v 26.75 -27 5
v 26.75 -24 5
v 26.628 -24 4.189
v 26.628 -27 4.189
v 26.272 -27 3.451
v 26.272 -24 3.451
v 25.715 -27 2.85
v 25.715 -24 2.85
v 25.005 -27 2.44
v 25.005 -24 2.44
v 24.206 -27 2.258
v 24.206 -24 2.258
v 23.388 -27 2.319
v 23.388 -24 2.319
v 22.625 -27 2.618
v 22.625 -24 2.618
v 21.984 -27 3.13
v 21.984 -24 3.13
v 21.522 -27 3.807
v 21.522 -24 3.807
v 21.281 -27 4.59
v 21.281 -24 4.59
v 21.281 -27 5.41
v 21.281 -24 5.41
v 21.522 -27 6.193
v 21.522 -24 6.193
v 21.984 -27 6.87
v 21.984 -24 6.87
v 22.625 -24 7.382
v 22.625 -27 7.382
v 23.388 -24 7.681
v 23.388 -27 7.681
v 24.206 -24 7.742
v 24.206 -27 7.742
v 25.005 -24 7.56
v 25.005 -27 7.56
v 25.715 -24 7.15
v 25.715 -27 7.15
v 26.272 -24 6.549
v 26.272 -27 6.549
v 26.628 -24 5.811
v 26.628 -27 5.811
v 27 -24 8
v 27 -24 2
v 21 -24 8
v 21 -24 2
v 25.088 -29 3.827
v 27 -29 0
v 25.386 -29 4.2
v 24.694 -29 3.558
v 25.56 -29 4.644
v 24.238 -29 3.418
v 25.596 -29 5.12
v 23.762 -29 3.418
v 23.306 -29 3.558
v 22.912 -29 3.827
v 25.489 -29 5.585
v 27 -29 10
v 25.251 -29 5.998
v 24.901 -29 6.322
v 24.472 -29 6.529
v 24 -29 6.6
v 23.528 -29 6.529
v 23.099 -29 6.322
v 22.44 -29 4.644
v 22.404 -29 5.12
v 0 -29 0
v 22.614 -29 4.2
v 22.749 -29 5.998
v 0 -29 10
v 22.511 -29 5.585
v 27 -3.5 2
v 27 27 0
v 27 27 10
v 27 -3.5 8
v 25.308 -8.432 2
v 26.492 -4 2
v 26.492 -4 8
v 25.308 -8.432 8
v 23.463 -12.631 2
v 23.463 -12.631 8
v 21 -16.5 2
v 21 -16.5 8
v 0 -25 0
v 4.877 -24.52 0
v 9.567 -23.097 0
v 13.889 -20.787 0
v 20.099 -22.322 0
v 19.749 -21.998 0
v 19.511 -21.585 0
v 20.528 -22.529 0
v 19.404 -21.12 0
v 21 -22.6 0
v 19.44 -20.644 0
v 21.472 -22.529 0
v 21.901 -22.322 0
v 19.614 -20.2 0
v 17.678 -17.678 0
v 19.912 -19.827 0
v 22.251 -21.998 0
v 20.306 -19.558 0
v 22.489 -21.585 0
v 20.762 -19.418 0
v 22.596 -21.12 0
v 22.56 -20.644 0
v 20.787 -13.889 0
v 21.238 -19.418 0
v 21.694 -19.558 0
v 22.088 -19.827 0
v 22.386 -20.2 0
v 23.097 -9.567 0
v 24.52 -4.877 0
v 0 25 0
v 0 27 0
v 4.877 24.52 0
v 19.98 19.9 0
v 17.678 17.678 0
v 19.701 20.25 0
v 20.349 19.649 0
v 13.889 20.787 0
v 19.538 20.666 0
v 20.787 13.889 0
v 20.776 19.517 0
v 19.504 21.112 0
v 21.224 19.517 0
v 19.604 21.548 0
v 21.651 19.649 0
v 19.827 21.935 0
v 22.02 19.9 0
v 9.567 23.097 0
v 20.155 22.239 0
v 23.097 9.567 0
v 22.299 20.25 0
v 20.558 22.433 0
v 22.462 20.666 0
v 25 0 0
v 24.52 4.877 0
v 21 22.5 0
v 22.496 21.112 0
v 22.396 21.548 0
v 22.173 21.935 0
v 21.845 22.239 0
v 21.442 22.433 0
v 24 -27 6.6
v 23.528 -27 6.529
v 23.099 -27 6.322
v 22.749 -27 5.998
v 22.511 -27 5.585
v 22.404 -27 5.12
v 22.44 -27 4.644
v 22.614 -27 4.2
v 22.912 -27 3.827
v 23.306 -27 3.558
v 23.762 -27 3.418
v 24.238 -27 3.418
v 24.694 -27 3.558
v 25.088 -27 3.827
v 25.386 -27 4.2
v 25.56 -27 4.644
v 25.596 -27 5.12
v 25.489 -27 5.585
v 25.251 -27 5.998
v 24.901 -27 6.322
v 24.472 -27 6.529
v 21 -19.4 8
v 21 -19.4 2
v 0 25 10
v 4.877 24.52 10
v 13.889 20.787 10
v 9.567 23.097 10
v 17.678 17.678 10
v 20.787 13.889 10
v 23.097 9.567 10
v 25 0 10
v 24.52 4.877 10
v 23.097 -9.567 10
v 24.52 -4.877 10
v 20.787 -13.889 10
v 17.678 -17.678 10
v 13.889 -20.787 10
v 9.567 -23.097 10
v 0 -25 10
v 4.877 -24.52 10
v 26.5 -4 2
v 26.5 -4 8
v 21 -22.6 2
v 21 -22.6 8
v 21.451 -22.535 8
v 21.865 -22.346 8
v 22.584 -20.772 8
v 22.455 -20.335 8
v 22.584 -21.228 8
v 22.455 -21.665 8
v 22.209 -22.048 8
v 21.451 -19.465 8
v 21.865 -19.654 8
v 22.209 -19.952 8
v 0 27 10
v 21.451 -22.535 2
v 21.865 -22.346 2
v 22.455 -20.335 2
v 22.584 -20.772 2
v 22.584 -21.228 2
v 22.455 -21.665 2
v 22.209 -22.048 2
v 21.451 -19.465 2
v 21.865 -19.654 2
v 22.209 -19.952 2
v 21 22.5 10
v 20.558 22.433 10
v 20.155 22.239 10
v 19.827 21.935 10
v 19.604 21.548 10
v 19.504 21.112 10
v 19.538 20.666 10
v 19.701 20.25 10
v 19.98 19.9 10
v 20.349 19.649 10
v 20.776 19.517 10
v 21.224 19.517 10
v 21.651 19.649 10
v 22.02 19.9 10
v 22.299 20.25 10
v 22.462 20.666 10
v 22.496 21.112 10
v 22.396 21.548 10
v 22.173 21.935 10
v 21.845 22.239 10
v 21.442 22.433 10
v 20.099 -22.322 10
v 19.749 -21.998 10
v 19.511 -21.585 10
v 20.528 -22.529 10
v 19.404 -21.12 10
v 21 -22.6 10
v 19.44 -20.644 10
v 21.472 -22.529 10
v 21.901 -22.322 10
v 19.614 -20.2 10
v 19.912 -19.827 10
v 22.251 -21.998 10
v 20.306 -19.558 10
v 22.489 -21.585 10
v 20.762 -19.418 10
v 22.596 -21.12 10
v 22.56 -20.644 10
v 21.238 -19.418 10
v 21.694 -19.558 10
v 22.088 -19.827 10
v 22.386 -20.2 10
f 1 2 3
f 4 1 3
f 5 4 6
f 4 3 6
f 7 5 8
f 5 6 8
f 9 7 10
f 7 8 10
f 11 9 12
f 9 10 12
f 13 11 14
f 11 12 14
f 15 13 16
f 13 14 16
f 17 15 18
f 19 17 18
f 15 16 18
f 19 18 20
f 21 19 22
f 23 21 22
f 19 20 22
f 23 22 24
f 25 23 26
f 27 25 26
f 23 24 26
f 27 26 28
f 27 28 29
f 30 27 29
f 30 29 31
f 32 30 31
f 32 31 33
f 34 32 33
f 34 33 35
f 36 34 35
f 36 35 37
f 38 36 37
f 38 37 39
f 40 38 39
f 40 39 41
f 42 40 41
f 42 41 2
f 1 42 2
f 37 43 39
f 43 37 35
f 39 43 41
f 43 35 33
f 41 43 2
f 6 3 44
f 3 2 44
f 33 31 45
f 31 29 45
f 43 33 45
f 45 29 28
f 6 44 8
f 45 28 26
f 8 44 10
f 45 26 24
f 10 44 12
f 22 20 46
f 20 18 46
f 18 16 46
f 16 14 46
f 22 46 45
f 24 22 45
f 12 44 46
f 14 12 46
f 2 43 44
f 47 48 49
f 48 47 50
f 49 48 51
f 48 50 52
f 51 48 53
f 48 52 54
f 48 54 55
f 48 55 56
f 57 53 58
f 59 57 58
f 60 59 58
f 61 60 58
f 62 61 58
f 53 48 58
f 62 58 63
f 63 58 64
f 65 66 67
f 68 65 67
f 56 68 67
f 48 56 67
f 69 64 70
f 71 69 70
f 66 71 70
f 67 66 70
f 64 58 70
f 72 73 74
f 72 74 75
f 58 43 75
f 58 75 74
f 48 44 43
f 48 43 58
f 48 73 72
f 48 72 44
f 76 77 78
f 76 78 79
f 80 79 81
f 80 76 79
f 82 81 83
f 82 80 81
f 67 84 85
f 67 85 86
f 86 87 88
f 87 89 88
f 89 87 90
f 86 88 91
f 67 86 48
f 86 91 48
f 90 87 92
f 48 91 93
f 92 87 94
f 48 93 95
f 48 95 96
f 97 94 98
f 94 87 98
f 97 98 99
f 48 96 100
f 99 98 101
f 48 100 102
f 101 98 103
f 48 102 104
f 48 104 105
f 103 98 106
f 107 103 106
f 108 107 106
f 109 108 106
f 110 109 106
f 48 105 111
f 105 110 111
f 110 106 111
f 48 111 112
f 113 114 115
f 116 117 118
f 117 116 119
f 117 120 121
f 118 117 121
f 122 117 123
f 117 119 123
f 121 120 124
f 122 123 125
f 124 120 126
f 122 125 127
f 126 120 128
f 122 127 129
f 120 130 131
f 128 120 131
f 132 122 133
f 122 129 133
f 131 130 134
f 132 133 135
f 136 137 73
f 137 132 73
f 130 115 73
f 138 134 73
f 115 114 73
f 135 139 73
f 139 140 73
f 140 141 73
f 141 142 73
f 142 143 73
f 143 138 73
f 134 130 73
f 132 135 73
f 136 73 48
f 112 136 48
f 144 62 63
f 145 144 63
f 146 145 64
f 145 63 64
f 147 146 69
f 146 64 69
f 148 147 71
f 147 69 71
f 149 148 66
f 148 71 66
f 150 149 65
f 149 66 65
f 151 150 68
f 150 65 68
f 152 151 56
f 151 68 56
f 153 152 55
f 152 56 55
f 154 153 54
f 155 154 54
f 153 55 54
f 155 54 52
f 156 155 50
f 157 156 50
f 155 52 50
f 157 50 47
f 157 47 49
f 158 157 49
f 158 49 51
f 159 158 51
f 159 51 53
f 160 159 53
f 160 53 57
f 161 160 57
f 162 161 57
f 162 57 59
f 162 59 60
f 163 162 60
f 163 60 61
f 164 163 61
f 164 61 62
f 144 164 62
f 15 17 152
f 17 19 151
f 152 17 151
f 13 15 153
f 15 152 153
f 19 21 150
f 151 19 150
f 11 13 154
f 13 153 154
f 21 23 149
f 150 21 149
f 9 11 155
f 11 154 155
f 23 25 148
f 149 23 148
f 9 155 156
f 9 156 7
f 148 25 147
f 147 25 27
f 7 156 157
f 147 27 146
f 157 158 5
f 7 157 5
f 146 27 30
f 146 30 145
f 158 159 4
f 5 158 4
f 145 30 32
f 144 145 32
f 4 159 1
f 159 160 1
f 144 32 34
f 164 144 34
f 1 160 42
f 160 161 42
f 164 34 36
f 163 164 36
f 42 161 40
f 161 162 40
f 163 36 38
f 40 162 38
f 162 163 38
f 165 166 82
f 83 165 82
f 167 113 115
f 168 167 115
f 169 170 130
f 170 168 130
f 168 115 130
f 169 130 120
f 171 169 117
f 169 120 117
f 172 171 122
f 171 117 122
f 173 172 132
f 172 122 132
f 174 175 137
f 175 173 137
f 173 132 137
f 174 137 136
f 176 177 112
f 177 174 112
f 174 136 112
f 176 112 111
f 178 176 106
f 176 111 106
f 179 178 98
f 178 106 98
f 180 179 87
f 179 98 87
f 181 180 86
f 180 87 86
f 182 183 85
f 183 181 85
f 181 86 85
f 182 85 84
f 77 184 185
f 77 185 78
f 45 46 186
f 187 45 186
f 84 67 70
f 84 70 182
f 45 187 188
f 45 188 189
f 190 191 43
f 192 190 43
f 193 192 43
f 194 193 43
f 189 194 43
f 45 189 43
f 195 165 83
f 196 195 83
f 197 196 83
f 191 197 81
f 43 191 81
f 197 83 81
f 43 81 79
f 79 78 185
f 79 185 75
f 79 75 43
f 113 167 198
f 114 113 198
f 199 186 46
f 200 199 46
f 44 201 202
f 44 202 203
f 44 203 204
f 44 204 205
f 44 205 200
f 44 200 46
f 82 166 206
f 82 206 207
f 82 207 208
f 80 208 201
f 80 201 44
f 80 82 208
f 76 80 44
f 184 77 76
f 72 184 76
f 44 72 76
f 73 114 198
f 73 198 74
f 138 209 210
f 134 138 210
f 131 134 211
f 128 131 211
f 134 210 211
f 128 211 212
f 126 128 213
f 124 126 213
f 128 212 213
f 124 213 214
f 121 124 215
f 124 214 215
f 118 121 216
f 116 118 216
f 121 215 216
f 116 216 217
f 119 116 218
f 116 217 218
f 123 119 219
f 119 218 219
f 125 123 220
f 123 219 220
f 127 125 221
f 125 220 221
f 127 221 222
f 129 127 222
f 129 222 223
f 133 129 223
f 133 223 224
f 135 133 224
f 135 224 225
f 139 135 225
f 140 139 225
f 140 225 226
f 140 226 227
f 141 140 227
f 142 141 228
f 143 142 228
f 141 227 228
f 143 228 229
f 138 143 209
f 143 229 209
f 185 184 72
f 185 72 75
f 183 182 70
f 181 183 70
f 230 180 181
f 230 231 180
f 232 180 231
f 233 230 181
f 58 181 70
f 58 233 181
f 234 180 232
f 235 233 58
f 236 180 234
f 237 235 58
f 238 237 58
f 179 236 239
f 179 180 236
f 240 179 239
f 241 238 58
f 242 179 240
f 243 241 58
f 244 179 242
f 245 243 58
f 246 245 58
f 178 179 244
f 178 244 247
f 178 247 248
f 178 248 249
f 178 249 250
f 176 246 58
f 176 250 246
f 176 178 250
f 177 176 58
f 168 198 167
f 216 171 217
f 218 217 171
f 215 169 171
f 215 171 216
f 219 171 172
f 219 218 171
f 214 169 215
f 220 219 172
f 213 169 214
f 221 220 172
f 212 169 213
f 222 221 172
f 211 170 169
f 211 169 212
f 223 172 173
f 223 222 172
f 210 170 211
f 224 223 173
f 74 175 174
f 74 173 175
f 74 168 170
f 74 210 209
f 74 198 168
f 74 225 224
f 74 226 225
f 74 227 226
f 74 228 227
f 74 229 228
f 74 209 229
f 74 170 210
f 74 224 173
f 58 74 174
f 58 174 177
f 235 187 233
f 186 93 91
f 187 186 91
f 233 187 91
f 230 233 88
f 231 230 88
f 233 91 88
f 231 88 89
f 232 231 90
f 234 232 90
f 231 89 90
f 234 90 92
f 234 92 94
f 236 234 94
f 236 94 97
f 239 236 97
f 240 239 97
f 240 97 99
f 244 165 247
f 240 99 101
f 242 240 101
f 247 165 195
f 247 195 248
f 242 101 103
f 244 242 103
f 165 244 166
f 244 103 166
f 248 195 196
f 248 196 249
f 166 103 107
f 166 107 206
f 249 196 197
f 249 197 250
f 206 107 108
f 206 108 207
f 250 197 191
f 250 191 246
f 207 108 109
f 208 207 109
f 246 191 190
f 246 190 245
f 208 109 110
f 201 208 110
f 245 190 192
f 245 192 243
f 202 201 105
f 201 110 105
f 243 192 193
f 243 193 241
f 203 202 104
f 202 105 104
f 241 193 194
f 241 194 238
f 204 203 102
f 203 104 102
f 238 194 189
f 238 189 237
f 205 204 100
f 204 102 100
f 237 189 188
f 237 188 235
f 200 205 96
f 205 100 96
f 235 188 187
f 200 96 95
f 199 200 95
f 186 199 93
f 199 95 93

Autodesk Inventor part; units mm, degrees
ref_plane "YZ Plane" through (0, 0, 0) normal (1, 0, 0) x (0, 1, 0)
ref_plane "XZ Plane" through (0, 0, 0) normal (0, 1, 0) x (-1, 0, 0)
sketch "Sketch1" plane through (0, 0, 0) normal (0, 0, 1) x (1, 0, 0)
  circle A0 centre (0, 0) radius 25 construction
  arc A1 (0, -25) -> (0, 25) centre (0, 0) ccw
  line L0 (0, 25) -> (0, 27)
  line L1 (0, 27) -> (27, 27)
  line L2 (27, 27) -> (27, -27)
  line L3 (27, -27) -> (0, -27)
  line L4 (0, -27) -> (0, -25)
  line L5 (0, 0) -> (27, 0) construction
  dimension "d0" = 50
  dimension "d2" = 27
  dimension "d4" = 54
  dimension "d5" = 2
extrude "Extrusion1" add sketch "Sketch1" along normal blind 10
ref_plane "Work Plane1" through (0, 0, 5) normal (0, 0, 1) x (1, 0, 0)
sketch "Sketch3" plane through (0, 0, 5) normal (0, 0, 1) x (1, 0, 0)
  line L0 (27, -27) -> (27, 27) projected
  line L1 (27, -24) -> (21, -24)
  line L2 (0, -27) -> (27, -27) projected
  line L3 (21, -24) -> (21, -16.5)
  line L4 (27, -4) -> (26.4915, -4)
  arc A0 (21, -16.5) -> (26.4915, -4) centre (-3, 1.5) ccw
  line L5 (27, -4) -> (27, -24)
  point P0 (0, 0)
  dimension "d17" = 3
  dimension "d18" = 20
  dimension "d19" = 30
  dimension "d20" = 1.5
  dimension "d21" = 3
  dimension "d22" = 6
extrude "Extrusion3" cut sketch "Sketch3" along normal mid plane 6
sketch "Sketch4" plane through (0, 0, 10) normal (0, 0, 1) x (1, 0, 0)
  circle A0 centre (21, -21) radius 1.6
  point P0 (0, 0)
  dimension "d25" = 3.2
  dimension "d26" = 21
  dimension "d27" = 21
hole "Hole1" at (21, -21, 10) direction (0, 0, -1) diameter 3.2 depth 20 tip angle 118
chamfer "Chamfer2" distance 0.5 angle 45 1 edges at (27, -4, 5)
sketch "Sketch5" plane through (21, -24, 2) normal (0, 1, 0) x (1, 0, 0)
  circle A0 centre (3, -3) radius 1.6
  line L0 (11.4, -3) -> (-26.4, -3) projected
  line L1 (-21, 2) -> (-21, -8) projected
  circle A1 centre (3, -3) radius 2.75
  dimension "d38" = 3.2
  dimension "d39" = 24
  dimension "d40" = 5.5
hole "Hole2" at (24, -24, 5) direction (0, -1, 0) diameter 3.2 depth 20 tip angle 118
extrude "Extrusion4" cut sketch "Sketch5" against normal blind 3 contours L0 A1 A0 | A0 L0 A1
sketch "Sketch6" plane through (0, 0, 10) normal (0, 0, 1) x (1, 0, 0)
  line L0 (0, -27) -> (27, -27)
  line L1 (27, -27) -> (27, -29)
  line L2 (27, -29) -> (0, -29)
  line L3 (0, -29) -> (0, -27)
  line L4 (27, -27) -> (27, 27) projected
  line L5 (0, -25) -> (0, -27) projected
  line L6 (0, -27) -> (27, -27) projected
  point P0 (0, 0)
  dimension "d50" = 2
extrude "Extrusion5" add sketch "Sketch6" against normal blind 10
hole "Hole3" at (24, -24, 5) direction (0, -1, 0) diameter 3.2 depth 20 tip angle 118
sketch "Sketch7" plane through (0, 0, 10) normal (0, 0, 1) x (1, 0, 0)
  line L0 (27, 27) -> (0, 27) projected
  line L1 (0, 27) -> (27, 27)
  line L2 (27, 27) -> (27, 24)
  line L3 (27, 24) -> (0, 24)
  line L4 (0, 24) -> (0, 27)
  line L5 (27, -29) -> (27, 27) projected
  point P0 (0, 0)
  dimension "d60" = 3
sketch "Sketch8" plane through (0, 0, 0) normal (0, 0, -1) x (-1, 0, 0)
  circle A0 centre (-21, 21) radius 1.85 projected
  circle A1 centre (-21, 21) radius 1.85 projected
  circle A2 centre (-21, 21) radius 1.85
  point P0 (0, 0)
hole "Hole4" at (21, 21, 0) direction (0, 0, 1) diameter 3 depth 10
properties part number "Aufnahme_Fan_02"
